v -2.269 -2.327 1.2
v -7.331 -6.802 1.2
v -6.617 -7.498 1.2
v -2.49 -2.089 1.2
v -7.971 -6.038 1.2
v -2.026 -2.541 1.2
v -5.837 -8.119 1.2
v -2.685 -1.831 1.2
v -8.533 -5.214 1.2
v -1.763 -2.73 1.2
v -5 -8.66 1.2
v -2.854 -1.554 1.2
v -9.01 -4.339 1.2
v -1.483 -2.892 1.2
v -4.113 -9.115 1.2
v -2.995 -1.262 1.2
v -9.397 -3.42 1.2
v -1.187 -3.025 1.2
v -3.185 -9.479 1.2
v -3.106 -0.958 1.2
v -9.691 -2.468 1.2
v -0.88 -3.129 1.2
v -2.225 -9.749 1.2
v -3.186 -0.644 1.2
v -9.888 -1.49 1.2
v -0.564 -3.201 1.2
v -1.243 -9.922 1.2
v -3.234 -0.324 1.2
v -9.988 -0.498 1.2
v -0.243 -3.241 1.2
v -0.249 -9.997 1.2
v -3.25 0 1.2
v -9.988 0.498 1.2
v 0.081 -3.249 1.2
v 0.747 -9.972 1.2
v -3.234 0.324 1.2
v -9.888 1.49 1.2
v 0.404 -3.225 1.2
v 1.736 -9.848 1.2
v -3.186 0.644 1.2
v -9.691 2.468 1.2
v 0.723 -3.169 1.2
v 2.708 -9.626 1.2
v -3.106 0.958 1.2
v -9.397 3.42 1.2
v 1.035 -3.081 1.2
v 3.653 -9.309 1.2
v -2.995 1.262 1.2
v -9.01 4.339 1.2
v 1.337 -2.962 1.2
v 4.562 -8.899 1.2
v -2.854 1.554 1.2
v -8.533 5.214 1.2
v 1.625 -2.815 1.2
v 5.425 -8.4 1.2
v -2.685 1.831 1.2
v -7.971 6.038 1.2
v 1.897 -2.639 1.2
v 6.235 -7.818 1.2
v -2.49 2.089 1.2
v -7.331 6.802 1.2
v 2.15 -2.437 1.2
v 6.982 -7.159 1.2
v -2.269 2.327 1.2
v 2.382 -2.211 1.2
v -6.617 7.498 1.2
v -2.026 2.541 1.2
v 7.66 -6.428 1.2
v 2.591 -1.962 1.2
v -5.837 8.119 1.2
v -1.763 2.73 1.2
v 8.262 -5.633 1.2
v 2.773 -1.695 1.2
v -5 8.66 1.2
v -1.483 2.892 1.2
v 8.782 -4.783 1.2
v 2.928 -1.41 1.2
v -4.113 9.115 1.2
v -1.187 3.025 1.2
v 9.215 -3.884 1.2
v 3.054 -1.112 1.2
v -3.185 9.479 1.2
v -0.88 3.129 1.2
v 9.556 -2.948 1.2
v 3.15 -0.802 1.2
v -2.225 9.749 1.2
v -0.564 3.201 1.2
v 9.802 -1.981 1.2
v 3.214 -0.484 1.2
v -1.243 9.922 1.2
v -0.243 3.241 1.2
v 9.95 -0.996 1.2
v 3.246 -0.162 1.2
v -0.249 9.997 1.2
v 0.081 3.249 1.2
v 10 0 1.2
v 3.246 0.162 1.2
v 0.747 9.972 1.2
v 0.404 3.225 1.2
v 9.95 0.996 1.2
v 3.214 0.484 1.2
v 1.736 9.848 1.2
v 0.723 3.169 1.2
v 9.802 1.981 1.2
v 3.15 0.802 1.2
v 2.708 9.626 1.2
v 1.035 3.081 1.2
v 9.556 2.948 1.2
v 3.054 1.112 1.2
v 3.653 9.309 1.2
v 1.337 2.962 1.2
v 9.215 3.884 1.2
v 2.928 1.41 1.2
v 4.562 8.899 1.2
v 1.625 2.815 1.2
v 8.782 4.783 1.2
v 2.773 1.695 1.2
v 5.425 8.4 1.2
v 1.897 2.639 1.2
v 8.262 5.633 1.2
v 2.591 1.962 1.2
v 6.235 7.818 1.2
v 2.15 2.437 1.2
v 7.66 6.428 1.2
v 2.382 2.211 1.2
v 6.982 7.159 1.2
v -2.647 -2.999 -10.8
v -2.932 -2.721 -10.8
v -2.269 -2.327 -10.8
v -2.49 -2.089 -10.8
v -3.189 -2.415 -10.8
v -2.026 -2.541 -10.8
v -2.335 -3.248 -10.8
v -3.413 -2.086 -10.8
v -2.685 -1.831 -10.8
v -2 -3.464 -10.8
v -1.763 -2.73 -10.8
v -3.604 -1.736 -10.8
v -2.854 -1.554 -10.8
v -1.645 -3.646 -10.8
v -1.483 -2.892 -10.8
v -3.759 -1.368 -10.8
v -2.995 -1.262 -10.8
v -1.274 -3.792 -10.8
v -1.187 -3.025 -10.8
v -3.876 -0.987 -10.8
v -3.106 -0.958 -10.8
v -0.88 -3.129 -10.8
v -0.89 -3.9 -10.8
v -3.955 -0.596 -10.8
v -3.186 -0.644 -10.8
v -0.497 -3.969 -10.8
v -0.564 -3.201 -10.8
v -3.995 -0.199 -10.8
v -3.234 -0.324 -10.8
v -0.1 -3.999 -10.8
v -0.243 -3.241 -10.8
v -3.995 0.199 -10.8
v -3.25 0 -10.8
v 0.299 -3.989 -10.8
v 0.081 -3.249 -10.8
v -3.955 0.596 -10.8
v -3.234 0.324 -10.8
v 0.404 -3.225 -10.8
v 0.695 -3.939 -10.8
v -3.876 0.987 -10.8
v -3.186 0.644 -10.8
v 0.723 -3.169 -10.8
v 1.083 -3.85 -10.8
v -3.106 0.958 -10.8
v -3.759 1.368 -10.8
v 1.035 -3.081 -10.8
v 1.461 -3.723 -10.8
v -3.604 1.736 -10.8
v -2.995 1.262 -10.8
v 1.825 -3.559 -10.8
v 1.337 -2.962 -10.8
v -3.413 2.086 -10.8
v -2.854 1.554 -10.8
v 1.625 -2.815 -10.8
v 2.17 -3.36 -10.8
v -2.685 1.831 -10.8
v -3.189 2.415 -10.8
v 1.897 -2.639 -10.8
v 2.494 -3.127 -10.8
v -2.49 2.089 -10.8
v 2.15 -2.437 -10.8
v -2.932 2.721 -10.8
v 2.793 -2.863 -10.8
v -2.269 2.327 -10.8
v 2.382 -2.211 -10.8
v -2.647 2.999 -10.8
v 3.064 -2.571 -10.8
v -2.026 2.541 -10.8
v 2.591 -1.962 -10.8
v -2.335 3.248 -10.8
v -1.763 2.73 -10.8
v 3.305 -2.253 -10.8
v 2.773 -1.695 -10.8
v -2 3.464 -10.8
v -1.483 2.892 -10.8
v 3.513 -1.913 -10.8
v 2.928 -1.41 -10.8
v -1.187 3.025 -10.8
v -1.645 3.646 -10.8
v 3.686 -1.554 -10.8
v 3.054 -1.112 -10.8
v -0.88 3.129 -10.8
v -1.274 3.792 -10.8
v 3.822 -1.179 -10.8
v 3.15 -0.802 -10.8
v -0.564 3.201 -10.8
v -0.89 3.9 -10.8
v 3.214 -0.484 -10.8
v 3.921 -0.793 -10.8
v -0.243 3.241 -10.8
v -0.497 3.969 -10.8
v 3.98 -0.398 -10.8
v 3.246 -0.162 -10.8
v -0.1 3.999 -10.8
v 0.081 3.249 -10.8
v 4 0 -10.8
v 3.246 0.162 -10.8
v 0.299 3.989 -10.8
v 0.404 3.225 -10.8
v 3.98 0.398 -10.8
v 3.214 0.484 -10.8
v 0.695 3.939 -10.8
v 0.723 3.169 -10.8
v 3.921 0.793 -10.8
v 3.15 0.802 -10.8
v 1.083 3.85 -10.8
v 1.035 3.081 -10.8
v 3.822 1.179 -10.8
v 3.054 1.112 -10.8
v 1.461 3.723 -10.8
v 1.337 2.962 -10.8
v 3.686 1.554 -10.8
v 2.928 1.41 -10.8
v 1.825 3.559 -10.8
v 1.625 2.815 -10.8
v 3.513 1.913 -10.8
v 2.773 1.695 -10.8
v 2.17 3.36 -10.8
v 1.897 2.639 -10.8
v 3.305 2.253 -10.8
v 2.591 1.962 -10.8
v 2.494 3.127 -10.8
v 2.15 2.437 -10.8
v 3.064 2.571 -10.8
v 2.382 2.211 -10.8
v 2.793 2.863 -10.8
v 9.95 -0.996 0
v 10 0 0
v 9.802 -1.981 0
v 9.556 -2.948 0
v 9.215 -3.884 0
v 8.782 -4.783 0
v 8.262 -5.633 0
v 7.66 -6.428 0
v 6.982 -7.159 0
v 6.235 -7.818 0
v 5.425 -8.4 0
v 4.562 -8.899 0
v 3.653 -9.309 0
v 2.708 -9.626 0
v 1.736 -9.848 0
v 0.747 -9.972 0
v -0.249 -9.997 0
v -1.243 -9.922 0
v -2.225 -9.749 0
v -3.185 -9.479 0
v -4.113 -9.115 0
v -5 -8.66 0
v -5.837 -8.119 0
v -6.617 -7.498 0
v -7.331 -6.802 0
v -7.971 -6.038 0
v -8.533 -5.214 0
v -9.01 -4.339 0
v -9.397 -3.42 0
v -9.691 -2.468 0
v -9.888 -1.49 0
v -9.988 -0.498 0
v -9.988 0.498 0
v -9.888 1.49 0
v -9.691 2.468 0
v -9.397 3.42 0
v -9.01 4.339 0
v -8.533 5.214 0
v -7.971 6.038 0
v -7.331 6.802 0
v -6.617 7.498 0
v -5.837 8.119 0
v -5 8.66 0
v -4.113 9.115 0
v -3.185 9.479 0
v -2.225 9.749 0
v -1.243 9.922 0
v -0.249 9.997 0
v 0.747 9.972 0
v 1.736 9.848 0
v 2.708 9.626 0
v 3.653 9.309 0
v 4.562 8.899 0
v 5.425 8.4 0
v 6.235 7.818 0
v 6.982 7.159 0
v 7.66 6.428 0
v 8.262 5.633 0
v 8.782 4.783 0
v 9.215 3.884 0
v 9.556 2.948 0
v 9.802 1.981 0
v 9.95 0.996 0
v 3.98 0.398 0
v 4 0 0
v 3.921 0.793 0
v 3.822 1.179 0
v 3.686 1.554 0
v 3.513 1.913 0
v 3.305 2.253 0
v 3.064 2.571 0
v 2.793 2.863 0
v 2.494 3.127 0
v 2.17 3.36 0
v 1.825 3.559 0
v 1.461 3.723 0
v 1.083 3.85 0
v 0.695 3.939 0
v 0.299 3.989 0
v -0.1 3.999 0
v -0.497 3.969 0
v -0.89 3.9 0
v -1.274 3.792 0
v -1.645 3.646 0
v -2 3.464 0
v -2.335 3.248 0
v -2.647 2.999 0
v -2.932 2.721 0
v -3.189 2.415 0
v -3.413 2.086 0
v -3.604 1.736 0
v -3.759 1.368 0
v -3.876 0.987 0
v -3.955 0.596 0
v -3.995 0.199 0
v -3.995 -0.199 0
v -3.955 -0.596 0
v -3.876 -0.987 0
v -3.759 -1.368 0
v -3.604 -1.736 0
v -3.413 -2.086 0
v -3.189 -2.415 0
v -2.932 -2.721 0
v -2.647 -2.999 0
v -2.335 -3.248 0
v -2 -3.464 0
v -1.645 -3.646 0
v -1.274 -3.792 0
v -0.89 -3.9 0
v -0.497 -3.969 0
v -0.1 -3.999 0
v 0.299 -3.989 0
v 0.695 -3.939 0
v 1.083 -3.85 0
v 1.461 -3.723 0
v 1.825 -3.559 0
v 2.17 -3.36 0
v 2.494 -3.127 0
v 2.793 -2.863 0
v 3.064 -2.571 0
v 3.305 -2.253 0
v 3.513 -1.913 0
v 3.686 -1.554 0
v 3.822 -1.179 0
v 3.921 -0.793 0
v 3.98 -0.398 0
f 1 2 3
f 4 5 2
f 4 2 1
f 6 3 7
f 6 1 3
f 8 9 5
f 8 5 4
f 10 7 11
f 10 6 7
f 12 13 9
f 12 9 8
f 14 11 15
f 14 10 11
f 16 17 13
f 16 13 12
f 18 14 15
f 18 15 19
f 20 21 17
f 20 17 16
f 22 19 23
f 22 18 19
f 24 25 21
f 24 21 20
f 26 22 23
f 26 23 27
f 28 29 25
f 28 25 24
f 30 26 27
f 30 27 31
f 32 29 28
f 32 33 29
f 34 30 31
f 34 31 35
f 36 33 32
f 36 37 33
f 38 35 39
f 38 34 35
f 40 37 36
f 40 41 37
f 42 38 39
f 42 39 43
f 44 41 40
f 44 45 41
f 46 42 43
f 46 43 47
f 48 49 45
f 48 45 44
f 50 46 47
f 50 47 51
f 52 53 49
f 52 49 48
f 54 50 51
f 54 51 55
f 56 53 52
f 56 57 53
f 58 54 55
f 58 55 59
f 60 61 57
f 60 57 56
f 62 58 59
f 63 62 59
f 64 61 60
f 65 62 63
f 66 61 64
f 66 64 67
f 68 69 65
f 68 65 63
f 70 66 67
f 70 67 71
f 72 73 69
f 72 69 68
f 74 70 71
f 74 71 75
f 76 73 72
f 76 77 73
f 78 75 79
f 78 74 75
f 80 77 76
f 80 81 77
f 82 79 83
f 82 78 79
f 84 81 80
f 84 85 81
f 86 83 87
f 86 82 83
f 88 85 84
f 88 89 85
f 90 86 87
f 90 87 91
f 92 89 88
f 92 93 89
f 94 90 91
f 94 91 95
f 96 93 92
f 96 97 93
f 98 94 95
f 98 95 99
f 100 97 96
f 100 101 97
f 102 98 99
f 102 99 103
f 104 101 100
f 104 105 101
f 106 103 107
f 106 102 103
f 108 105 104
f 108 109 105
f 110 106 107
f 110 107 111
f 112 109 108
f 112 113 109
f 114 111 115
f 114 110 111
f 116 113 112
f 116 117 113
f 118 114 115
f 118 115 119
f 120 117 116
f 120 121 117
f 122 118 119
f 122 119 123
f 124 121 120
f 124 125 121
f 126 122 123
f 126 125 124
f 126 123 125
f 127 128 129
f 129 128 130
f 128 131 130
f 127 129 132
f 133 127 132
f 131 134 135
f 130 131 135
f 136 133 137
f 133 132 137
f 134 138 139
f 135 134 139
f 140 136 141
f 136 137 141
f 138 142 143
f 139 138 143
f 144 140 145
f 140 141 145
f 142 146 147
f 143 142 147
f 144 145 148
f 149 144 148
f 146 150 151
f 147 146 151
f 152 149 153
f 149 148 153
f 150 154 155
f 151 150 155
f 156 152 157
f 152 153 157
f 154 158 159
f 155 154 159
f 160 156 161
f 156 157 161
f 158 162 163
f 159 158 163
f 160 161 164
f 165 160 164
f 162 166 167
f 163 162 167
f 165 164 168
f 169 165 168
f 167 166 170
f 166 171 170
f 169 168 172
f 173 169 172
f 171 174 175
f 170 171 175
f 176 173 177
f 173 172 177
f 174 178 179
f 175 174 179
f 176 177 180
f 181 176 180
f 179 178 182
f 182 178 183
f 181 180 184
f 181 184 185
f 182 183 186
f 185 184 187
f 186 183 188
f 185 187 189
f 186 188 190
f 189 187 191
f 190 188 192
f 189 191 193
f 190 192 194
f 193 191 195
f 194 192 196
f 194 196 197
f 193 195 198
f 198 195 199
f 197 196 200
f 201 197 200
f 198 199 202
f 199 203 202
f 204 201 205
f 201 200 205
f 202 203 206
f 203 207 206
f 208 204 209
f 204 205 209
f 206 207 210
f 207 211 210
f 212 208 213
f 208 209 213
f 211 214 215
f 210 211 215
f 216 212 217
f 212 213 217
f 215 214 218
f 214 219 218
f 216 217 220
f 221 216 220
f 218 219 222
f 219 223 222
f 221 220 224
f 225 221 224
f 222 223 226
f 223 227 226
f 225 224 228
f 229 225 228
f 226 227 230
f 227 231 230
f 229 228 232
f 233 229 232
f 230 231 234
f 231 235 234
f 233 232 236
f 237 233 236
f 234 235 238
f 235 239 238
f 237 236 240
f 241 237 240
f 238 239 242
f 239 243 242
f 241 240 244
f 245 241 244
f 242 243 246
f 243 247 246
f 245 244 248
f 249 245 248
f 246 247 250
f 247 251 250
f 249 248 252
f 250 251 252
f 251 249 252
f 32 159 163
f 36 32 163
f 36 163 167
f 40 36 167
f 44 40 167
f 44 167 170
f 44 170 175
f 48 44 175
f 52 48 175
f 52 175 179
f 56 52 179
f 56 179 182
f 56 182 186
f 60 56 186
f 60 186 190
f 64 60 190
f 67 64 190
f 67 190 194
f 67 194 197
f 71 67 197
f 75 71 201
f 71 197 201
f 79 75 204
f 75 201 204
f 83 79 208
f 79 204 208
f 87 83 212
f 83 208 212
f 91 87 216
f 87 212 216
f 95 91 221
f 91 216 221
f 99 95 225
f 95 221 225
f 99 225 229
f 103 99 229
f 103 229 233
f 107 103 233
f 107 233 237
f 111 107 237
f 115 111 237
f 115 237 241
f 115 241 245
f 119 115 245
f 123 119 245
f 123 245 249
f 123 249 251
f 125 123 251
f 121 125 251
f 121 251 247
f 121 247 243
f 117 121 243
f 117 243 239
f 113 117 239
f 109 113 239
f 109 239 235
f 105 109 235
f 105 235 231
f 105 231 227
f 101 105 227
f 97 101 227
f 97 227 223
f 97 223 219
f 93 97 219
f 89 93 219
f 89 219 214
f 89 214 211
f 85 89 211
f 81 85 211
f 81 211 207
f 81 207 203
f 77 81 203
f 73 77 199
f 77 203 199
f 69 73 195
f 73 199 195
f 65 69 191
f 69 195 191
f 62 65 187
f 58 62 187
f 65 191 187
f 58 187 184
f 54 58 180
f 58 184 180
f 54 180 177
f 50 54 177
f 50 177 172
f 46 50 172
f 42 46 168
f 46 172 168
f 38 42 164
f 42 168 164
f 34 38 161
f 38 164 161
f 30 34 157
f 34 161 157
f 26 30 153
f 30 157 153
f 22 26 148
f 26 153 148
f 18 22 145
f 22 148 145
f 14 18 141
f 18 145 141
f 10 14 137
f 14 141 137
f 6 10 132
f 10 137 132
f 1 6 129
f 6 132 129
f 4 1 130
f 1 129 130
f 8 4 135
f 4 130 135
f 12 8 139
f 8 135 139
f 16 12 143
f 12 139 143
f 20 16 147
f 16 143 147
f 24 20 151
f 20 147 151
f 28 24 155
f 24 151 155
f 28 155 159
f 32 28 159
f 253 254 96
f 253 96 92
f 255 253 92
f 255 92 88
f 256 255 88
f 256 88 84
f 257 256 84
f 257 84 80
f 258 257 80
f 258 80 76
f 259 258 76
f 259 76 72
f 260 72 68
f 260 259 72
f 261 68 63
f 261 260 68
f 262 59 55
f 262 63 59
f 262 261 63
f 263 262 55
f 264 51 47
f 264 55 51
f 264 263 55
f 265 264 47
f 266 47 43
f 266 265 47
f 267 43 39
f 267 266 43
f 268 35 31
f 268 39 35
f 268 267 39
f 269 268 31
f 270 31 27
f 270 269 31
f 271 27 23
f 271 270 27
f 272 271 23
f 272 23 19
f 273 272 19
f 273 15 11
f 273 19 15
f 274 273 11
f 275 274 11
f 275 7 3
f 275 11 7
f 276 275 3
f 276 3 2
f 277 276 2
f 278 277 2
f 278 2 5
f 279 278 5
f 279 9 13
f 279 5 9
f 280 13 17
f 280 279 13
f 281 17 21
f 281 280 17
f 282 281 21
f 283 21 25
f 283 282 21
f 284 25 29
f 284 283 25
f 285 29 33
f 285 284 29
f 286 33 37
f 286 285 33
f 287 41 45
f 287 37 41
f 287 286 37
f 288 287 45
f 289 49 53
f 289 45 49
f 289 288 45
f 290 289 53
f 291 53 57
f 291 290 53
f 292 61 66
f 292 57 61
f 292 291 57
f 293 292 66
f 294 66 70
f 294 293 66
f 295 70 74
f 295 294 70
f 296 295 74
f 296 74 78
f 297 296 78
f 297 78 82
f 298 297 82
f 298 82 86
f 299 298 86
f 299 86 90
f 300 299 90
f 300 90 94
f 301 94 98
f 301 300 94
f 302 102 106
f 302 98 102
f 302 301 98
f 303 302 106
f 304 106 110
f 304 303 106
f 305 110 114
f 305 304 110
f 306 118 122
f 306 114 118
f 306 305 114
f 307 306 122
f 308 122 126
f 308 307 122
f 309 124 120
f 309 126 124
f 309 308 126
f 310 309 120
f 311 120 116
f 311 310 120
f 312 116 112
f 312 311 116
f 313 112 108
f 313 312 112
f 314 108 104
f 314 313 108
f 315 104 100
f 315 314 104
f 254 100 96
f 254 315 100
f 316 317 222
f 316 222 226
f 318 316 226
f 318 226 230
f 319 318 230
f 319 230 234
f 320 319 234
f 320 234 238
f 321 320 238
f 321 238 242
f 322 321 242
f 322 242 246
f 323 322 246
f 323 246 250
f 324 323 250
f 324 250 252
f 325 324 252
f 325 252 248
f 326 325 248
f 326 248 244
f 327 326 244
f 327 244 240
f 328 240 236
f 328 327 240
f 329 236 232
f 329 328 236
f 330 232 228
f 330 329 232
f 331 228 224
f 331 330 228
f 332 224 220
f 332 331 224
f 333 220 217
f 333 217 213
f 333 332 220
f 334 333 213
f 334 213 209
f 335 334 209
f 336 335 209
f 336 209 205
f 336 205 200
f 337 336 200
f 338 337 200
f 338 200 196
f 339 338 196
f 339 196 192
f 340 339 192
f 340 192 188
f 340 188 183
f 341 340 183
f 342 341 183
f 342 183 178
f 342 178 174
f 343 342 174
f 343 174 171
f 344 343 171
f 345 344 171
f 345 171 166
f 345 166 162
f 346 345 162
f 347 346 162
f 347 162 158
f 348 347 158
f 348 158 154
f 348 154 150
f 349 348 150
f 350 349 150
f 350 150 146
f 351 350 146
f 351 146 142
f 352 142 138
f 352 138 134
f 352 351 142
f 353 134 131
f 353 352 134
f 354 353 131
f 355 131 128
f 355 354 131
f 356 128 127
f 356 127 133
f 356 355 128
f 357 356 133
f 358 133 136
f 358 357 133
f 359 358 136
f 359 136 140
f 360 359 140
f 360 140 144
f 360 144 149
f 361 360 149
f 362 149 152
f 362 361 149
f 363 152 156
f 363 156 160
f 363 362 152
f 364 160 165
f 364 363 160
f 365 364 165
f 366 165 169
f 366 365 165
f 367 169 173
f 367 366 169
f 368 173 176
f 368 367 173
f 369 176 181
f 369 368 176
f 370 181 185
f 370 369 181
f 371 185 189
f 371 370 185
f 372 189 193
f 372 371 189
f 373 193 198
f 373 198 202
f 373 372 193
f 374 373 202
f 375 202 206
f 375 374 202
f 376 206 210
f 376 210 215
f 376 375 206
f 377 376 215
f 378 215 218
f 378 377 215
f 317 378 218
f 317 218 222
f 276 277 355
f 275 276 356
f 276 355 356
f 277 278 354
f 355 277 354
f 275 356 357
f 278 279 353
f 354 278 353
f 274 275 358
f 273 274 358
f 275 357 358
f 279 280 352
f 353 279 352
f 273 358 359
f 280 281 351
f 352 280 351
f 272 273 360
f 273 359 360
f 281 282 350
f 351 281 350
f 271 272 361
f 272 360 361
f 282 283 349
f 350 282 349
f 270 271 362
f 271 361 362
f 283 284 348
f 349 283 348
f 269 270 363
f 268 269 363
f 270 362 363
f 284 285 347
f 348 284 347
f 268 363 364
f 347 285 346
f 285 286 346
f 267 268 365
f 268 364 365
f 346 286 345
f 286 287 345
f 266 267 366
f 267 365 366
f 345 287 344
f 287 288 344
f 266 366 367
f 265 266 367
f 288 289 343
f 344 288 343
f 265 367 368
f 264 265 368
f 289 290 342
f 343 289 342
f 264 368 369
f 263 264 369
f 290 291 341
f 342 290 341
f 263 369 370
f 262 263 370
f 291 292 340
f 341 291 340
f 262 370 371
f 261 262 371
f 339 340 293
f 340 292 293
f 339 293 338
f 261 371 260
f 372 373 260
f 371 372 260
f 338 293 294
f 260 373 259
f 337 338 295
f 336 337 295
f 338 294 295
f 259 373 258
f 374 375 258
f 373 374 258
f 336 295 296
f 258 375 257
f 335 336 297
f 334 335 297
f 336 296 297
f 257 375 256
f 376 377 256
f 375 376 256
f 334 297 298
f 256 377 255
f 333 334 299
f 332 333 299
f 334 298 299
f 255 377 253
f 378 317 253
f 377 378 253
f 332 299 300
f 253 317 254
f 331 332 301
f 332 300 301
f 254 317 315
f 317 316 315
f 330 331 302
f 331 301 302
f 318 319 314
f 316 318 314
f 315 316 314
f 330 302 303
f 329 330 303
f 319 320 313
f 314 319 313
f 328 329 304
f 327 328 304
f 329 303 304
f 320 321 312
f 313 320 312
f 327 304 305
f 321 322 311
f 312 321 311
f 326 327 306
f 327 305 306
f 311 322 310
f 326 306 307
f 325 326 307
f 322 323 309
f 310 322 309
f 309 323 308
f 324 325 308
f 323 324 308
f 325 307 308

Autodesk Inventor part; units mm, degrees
ref_plane "YZ Plane" through (0, 0, 0) normal (1, 0, 0) x (0, 1, 0)
ref_plane "XZ Plane" through (0, 0, 0) normal (0, 1, 0) x (-1, 0, 0)
ref_plane "XY Plane" through (0, 0, 0) normal (0, 0, 1) x (1, 0, 0)
sketch "草圖1" plane through (0, 0, 0) normal (0, 0, 1) x (1, 0, 0)
  circle A0 centre (0, 0) radius 10
  dimension "d0" = 20
extrude "擠出1" add sketch "草圖1" along normal blind 1.2
sketch "草圖2" plane through (0, 0, 0) normal (0, 0, -1) x (-1, 0, 0)
  circle A0 centre (0, 0) radius 4
  dimension "d4" = 8
extrude "擠出2" cut sketch "草圖2" against normal up to next
sketch "草圖3" plane through (0, 0, 1.2) normal (0, 0, 1) x (1, 0, 0)
  circle A0 centre (0, 0) radius 4
  dimension "d7" = 8
extrude "擠出3" add sketch "草圖3" against normal blind 12
sketch "草圖4" plane through (0, 0, -10.8) normal (0, 0, -1) x (-1, 0, 0)
  circle A0 centre (0, 0) radius 3.25
  dimension "d10" = 6.5
extrude "擠出4" cut sketch "草圖4" against normal up to next
properties part number "儀表鐵軸套"
